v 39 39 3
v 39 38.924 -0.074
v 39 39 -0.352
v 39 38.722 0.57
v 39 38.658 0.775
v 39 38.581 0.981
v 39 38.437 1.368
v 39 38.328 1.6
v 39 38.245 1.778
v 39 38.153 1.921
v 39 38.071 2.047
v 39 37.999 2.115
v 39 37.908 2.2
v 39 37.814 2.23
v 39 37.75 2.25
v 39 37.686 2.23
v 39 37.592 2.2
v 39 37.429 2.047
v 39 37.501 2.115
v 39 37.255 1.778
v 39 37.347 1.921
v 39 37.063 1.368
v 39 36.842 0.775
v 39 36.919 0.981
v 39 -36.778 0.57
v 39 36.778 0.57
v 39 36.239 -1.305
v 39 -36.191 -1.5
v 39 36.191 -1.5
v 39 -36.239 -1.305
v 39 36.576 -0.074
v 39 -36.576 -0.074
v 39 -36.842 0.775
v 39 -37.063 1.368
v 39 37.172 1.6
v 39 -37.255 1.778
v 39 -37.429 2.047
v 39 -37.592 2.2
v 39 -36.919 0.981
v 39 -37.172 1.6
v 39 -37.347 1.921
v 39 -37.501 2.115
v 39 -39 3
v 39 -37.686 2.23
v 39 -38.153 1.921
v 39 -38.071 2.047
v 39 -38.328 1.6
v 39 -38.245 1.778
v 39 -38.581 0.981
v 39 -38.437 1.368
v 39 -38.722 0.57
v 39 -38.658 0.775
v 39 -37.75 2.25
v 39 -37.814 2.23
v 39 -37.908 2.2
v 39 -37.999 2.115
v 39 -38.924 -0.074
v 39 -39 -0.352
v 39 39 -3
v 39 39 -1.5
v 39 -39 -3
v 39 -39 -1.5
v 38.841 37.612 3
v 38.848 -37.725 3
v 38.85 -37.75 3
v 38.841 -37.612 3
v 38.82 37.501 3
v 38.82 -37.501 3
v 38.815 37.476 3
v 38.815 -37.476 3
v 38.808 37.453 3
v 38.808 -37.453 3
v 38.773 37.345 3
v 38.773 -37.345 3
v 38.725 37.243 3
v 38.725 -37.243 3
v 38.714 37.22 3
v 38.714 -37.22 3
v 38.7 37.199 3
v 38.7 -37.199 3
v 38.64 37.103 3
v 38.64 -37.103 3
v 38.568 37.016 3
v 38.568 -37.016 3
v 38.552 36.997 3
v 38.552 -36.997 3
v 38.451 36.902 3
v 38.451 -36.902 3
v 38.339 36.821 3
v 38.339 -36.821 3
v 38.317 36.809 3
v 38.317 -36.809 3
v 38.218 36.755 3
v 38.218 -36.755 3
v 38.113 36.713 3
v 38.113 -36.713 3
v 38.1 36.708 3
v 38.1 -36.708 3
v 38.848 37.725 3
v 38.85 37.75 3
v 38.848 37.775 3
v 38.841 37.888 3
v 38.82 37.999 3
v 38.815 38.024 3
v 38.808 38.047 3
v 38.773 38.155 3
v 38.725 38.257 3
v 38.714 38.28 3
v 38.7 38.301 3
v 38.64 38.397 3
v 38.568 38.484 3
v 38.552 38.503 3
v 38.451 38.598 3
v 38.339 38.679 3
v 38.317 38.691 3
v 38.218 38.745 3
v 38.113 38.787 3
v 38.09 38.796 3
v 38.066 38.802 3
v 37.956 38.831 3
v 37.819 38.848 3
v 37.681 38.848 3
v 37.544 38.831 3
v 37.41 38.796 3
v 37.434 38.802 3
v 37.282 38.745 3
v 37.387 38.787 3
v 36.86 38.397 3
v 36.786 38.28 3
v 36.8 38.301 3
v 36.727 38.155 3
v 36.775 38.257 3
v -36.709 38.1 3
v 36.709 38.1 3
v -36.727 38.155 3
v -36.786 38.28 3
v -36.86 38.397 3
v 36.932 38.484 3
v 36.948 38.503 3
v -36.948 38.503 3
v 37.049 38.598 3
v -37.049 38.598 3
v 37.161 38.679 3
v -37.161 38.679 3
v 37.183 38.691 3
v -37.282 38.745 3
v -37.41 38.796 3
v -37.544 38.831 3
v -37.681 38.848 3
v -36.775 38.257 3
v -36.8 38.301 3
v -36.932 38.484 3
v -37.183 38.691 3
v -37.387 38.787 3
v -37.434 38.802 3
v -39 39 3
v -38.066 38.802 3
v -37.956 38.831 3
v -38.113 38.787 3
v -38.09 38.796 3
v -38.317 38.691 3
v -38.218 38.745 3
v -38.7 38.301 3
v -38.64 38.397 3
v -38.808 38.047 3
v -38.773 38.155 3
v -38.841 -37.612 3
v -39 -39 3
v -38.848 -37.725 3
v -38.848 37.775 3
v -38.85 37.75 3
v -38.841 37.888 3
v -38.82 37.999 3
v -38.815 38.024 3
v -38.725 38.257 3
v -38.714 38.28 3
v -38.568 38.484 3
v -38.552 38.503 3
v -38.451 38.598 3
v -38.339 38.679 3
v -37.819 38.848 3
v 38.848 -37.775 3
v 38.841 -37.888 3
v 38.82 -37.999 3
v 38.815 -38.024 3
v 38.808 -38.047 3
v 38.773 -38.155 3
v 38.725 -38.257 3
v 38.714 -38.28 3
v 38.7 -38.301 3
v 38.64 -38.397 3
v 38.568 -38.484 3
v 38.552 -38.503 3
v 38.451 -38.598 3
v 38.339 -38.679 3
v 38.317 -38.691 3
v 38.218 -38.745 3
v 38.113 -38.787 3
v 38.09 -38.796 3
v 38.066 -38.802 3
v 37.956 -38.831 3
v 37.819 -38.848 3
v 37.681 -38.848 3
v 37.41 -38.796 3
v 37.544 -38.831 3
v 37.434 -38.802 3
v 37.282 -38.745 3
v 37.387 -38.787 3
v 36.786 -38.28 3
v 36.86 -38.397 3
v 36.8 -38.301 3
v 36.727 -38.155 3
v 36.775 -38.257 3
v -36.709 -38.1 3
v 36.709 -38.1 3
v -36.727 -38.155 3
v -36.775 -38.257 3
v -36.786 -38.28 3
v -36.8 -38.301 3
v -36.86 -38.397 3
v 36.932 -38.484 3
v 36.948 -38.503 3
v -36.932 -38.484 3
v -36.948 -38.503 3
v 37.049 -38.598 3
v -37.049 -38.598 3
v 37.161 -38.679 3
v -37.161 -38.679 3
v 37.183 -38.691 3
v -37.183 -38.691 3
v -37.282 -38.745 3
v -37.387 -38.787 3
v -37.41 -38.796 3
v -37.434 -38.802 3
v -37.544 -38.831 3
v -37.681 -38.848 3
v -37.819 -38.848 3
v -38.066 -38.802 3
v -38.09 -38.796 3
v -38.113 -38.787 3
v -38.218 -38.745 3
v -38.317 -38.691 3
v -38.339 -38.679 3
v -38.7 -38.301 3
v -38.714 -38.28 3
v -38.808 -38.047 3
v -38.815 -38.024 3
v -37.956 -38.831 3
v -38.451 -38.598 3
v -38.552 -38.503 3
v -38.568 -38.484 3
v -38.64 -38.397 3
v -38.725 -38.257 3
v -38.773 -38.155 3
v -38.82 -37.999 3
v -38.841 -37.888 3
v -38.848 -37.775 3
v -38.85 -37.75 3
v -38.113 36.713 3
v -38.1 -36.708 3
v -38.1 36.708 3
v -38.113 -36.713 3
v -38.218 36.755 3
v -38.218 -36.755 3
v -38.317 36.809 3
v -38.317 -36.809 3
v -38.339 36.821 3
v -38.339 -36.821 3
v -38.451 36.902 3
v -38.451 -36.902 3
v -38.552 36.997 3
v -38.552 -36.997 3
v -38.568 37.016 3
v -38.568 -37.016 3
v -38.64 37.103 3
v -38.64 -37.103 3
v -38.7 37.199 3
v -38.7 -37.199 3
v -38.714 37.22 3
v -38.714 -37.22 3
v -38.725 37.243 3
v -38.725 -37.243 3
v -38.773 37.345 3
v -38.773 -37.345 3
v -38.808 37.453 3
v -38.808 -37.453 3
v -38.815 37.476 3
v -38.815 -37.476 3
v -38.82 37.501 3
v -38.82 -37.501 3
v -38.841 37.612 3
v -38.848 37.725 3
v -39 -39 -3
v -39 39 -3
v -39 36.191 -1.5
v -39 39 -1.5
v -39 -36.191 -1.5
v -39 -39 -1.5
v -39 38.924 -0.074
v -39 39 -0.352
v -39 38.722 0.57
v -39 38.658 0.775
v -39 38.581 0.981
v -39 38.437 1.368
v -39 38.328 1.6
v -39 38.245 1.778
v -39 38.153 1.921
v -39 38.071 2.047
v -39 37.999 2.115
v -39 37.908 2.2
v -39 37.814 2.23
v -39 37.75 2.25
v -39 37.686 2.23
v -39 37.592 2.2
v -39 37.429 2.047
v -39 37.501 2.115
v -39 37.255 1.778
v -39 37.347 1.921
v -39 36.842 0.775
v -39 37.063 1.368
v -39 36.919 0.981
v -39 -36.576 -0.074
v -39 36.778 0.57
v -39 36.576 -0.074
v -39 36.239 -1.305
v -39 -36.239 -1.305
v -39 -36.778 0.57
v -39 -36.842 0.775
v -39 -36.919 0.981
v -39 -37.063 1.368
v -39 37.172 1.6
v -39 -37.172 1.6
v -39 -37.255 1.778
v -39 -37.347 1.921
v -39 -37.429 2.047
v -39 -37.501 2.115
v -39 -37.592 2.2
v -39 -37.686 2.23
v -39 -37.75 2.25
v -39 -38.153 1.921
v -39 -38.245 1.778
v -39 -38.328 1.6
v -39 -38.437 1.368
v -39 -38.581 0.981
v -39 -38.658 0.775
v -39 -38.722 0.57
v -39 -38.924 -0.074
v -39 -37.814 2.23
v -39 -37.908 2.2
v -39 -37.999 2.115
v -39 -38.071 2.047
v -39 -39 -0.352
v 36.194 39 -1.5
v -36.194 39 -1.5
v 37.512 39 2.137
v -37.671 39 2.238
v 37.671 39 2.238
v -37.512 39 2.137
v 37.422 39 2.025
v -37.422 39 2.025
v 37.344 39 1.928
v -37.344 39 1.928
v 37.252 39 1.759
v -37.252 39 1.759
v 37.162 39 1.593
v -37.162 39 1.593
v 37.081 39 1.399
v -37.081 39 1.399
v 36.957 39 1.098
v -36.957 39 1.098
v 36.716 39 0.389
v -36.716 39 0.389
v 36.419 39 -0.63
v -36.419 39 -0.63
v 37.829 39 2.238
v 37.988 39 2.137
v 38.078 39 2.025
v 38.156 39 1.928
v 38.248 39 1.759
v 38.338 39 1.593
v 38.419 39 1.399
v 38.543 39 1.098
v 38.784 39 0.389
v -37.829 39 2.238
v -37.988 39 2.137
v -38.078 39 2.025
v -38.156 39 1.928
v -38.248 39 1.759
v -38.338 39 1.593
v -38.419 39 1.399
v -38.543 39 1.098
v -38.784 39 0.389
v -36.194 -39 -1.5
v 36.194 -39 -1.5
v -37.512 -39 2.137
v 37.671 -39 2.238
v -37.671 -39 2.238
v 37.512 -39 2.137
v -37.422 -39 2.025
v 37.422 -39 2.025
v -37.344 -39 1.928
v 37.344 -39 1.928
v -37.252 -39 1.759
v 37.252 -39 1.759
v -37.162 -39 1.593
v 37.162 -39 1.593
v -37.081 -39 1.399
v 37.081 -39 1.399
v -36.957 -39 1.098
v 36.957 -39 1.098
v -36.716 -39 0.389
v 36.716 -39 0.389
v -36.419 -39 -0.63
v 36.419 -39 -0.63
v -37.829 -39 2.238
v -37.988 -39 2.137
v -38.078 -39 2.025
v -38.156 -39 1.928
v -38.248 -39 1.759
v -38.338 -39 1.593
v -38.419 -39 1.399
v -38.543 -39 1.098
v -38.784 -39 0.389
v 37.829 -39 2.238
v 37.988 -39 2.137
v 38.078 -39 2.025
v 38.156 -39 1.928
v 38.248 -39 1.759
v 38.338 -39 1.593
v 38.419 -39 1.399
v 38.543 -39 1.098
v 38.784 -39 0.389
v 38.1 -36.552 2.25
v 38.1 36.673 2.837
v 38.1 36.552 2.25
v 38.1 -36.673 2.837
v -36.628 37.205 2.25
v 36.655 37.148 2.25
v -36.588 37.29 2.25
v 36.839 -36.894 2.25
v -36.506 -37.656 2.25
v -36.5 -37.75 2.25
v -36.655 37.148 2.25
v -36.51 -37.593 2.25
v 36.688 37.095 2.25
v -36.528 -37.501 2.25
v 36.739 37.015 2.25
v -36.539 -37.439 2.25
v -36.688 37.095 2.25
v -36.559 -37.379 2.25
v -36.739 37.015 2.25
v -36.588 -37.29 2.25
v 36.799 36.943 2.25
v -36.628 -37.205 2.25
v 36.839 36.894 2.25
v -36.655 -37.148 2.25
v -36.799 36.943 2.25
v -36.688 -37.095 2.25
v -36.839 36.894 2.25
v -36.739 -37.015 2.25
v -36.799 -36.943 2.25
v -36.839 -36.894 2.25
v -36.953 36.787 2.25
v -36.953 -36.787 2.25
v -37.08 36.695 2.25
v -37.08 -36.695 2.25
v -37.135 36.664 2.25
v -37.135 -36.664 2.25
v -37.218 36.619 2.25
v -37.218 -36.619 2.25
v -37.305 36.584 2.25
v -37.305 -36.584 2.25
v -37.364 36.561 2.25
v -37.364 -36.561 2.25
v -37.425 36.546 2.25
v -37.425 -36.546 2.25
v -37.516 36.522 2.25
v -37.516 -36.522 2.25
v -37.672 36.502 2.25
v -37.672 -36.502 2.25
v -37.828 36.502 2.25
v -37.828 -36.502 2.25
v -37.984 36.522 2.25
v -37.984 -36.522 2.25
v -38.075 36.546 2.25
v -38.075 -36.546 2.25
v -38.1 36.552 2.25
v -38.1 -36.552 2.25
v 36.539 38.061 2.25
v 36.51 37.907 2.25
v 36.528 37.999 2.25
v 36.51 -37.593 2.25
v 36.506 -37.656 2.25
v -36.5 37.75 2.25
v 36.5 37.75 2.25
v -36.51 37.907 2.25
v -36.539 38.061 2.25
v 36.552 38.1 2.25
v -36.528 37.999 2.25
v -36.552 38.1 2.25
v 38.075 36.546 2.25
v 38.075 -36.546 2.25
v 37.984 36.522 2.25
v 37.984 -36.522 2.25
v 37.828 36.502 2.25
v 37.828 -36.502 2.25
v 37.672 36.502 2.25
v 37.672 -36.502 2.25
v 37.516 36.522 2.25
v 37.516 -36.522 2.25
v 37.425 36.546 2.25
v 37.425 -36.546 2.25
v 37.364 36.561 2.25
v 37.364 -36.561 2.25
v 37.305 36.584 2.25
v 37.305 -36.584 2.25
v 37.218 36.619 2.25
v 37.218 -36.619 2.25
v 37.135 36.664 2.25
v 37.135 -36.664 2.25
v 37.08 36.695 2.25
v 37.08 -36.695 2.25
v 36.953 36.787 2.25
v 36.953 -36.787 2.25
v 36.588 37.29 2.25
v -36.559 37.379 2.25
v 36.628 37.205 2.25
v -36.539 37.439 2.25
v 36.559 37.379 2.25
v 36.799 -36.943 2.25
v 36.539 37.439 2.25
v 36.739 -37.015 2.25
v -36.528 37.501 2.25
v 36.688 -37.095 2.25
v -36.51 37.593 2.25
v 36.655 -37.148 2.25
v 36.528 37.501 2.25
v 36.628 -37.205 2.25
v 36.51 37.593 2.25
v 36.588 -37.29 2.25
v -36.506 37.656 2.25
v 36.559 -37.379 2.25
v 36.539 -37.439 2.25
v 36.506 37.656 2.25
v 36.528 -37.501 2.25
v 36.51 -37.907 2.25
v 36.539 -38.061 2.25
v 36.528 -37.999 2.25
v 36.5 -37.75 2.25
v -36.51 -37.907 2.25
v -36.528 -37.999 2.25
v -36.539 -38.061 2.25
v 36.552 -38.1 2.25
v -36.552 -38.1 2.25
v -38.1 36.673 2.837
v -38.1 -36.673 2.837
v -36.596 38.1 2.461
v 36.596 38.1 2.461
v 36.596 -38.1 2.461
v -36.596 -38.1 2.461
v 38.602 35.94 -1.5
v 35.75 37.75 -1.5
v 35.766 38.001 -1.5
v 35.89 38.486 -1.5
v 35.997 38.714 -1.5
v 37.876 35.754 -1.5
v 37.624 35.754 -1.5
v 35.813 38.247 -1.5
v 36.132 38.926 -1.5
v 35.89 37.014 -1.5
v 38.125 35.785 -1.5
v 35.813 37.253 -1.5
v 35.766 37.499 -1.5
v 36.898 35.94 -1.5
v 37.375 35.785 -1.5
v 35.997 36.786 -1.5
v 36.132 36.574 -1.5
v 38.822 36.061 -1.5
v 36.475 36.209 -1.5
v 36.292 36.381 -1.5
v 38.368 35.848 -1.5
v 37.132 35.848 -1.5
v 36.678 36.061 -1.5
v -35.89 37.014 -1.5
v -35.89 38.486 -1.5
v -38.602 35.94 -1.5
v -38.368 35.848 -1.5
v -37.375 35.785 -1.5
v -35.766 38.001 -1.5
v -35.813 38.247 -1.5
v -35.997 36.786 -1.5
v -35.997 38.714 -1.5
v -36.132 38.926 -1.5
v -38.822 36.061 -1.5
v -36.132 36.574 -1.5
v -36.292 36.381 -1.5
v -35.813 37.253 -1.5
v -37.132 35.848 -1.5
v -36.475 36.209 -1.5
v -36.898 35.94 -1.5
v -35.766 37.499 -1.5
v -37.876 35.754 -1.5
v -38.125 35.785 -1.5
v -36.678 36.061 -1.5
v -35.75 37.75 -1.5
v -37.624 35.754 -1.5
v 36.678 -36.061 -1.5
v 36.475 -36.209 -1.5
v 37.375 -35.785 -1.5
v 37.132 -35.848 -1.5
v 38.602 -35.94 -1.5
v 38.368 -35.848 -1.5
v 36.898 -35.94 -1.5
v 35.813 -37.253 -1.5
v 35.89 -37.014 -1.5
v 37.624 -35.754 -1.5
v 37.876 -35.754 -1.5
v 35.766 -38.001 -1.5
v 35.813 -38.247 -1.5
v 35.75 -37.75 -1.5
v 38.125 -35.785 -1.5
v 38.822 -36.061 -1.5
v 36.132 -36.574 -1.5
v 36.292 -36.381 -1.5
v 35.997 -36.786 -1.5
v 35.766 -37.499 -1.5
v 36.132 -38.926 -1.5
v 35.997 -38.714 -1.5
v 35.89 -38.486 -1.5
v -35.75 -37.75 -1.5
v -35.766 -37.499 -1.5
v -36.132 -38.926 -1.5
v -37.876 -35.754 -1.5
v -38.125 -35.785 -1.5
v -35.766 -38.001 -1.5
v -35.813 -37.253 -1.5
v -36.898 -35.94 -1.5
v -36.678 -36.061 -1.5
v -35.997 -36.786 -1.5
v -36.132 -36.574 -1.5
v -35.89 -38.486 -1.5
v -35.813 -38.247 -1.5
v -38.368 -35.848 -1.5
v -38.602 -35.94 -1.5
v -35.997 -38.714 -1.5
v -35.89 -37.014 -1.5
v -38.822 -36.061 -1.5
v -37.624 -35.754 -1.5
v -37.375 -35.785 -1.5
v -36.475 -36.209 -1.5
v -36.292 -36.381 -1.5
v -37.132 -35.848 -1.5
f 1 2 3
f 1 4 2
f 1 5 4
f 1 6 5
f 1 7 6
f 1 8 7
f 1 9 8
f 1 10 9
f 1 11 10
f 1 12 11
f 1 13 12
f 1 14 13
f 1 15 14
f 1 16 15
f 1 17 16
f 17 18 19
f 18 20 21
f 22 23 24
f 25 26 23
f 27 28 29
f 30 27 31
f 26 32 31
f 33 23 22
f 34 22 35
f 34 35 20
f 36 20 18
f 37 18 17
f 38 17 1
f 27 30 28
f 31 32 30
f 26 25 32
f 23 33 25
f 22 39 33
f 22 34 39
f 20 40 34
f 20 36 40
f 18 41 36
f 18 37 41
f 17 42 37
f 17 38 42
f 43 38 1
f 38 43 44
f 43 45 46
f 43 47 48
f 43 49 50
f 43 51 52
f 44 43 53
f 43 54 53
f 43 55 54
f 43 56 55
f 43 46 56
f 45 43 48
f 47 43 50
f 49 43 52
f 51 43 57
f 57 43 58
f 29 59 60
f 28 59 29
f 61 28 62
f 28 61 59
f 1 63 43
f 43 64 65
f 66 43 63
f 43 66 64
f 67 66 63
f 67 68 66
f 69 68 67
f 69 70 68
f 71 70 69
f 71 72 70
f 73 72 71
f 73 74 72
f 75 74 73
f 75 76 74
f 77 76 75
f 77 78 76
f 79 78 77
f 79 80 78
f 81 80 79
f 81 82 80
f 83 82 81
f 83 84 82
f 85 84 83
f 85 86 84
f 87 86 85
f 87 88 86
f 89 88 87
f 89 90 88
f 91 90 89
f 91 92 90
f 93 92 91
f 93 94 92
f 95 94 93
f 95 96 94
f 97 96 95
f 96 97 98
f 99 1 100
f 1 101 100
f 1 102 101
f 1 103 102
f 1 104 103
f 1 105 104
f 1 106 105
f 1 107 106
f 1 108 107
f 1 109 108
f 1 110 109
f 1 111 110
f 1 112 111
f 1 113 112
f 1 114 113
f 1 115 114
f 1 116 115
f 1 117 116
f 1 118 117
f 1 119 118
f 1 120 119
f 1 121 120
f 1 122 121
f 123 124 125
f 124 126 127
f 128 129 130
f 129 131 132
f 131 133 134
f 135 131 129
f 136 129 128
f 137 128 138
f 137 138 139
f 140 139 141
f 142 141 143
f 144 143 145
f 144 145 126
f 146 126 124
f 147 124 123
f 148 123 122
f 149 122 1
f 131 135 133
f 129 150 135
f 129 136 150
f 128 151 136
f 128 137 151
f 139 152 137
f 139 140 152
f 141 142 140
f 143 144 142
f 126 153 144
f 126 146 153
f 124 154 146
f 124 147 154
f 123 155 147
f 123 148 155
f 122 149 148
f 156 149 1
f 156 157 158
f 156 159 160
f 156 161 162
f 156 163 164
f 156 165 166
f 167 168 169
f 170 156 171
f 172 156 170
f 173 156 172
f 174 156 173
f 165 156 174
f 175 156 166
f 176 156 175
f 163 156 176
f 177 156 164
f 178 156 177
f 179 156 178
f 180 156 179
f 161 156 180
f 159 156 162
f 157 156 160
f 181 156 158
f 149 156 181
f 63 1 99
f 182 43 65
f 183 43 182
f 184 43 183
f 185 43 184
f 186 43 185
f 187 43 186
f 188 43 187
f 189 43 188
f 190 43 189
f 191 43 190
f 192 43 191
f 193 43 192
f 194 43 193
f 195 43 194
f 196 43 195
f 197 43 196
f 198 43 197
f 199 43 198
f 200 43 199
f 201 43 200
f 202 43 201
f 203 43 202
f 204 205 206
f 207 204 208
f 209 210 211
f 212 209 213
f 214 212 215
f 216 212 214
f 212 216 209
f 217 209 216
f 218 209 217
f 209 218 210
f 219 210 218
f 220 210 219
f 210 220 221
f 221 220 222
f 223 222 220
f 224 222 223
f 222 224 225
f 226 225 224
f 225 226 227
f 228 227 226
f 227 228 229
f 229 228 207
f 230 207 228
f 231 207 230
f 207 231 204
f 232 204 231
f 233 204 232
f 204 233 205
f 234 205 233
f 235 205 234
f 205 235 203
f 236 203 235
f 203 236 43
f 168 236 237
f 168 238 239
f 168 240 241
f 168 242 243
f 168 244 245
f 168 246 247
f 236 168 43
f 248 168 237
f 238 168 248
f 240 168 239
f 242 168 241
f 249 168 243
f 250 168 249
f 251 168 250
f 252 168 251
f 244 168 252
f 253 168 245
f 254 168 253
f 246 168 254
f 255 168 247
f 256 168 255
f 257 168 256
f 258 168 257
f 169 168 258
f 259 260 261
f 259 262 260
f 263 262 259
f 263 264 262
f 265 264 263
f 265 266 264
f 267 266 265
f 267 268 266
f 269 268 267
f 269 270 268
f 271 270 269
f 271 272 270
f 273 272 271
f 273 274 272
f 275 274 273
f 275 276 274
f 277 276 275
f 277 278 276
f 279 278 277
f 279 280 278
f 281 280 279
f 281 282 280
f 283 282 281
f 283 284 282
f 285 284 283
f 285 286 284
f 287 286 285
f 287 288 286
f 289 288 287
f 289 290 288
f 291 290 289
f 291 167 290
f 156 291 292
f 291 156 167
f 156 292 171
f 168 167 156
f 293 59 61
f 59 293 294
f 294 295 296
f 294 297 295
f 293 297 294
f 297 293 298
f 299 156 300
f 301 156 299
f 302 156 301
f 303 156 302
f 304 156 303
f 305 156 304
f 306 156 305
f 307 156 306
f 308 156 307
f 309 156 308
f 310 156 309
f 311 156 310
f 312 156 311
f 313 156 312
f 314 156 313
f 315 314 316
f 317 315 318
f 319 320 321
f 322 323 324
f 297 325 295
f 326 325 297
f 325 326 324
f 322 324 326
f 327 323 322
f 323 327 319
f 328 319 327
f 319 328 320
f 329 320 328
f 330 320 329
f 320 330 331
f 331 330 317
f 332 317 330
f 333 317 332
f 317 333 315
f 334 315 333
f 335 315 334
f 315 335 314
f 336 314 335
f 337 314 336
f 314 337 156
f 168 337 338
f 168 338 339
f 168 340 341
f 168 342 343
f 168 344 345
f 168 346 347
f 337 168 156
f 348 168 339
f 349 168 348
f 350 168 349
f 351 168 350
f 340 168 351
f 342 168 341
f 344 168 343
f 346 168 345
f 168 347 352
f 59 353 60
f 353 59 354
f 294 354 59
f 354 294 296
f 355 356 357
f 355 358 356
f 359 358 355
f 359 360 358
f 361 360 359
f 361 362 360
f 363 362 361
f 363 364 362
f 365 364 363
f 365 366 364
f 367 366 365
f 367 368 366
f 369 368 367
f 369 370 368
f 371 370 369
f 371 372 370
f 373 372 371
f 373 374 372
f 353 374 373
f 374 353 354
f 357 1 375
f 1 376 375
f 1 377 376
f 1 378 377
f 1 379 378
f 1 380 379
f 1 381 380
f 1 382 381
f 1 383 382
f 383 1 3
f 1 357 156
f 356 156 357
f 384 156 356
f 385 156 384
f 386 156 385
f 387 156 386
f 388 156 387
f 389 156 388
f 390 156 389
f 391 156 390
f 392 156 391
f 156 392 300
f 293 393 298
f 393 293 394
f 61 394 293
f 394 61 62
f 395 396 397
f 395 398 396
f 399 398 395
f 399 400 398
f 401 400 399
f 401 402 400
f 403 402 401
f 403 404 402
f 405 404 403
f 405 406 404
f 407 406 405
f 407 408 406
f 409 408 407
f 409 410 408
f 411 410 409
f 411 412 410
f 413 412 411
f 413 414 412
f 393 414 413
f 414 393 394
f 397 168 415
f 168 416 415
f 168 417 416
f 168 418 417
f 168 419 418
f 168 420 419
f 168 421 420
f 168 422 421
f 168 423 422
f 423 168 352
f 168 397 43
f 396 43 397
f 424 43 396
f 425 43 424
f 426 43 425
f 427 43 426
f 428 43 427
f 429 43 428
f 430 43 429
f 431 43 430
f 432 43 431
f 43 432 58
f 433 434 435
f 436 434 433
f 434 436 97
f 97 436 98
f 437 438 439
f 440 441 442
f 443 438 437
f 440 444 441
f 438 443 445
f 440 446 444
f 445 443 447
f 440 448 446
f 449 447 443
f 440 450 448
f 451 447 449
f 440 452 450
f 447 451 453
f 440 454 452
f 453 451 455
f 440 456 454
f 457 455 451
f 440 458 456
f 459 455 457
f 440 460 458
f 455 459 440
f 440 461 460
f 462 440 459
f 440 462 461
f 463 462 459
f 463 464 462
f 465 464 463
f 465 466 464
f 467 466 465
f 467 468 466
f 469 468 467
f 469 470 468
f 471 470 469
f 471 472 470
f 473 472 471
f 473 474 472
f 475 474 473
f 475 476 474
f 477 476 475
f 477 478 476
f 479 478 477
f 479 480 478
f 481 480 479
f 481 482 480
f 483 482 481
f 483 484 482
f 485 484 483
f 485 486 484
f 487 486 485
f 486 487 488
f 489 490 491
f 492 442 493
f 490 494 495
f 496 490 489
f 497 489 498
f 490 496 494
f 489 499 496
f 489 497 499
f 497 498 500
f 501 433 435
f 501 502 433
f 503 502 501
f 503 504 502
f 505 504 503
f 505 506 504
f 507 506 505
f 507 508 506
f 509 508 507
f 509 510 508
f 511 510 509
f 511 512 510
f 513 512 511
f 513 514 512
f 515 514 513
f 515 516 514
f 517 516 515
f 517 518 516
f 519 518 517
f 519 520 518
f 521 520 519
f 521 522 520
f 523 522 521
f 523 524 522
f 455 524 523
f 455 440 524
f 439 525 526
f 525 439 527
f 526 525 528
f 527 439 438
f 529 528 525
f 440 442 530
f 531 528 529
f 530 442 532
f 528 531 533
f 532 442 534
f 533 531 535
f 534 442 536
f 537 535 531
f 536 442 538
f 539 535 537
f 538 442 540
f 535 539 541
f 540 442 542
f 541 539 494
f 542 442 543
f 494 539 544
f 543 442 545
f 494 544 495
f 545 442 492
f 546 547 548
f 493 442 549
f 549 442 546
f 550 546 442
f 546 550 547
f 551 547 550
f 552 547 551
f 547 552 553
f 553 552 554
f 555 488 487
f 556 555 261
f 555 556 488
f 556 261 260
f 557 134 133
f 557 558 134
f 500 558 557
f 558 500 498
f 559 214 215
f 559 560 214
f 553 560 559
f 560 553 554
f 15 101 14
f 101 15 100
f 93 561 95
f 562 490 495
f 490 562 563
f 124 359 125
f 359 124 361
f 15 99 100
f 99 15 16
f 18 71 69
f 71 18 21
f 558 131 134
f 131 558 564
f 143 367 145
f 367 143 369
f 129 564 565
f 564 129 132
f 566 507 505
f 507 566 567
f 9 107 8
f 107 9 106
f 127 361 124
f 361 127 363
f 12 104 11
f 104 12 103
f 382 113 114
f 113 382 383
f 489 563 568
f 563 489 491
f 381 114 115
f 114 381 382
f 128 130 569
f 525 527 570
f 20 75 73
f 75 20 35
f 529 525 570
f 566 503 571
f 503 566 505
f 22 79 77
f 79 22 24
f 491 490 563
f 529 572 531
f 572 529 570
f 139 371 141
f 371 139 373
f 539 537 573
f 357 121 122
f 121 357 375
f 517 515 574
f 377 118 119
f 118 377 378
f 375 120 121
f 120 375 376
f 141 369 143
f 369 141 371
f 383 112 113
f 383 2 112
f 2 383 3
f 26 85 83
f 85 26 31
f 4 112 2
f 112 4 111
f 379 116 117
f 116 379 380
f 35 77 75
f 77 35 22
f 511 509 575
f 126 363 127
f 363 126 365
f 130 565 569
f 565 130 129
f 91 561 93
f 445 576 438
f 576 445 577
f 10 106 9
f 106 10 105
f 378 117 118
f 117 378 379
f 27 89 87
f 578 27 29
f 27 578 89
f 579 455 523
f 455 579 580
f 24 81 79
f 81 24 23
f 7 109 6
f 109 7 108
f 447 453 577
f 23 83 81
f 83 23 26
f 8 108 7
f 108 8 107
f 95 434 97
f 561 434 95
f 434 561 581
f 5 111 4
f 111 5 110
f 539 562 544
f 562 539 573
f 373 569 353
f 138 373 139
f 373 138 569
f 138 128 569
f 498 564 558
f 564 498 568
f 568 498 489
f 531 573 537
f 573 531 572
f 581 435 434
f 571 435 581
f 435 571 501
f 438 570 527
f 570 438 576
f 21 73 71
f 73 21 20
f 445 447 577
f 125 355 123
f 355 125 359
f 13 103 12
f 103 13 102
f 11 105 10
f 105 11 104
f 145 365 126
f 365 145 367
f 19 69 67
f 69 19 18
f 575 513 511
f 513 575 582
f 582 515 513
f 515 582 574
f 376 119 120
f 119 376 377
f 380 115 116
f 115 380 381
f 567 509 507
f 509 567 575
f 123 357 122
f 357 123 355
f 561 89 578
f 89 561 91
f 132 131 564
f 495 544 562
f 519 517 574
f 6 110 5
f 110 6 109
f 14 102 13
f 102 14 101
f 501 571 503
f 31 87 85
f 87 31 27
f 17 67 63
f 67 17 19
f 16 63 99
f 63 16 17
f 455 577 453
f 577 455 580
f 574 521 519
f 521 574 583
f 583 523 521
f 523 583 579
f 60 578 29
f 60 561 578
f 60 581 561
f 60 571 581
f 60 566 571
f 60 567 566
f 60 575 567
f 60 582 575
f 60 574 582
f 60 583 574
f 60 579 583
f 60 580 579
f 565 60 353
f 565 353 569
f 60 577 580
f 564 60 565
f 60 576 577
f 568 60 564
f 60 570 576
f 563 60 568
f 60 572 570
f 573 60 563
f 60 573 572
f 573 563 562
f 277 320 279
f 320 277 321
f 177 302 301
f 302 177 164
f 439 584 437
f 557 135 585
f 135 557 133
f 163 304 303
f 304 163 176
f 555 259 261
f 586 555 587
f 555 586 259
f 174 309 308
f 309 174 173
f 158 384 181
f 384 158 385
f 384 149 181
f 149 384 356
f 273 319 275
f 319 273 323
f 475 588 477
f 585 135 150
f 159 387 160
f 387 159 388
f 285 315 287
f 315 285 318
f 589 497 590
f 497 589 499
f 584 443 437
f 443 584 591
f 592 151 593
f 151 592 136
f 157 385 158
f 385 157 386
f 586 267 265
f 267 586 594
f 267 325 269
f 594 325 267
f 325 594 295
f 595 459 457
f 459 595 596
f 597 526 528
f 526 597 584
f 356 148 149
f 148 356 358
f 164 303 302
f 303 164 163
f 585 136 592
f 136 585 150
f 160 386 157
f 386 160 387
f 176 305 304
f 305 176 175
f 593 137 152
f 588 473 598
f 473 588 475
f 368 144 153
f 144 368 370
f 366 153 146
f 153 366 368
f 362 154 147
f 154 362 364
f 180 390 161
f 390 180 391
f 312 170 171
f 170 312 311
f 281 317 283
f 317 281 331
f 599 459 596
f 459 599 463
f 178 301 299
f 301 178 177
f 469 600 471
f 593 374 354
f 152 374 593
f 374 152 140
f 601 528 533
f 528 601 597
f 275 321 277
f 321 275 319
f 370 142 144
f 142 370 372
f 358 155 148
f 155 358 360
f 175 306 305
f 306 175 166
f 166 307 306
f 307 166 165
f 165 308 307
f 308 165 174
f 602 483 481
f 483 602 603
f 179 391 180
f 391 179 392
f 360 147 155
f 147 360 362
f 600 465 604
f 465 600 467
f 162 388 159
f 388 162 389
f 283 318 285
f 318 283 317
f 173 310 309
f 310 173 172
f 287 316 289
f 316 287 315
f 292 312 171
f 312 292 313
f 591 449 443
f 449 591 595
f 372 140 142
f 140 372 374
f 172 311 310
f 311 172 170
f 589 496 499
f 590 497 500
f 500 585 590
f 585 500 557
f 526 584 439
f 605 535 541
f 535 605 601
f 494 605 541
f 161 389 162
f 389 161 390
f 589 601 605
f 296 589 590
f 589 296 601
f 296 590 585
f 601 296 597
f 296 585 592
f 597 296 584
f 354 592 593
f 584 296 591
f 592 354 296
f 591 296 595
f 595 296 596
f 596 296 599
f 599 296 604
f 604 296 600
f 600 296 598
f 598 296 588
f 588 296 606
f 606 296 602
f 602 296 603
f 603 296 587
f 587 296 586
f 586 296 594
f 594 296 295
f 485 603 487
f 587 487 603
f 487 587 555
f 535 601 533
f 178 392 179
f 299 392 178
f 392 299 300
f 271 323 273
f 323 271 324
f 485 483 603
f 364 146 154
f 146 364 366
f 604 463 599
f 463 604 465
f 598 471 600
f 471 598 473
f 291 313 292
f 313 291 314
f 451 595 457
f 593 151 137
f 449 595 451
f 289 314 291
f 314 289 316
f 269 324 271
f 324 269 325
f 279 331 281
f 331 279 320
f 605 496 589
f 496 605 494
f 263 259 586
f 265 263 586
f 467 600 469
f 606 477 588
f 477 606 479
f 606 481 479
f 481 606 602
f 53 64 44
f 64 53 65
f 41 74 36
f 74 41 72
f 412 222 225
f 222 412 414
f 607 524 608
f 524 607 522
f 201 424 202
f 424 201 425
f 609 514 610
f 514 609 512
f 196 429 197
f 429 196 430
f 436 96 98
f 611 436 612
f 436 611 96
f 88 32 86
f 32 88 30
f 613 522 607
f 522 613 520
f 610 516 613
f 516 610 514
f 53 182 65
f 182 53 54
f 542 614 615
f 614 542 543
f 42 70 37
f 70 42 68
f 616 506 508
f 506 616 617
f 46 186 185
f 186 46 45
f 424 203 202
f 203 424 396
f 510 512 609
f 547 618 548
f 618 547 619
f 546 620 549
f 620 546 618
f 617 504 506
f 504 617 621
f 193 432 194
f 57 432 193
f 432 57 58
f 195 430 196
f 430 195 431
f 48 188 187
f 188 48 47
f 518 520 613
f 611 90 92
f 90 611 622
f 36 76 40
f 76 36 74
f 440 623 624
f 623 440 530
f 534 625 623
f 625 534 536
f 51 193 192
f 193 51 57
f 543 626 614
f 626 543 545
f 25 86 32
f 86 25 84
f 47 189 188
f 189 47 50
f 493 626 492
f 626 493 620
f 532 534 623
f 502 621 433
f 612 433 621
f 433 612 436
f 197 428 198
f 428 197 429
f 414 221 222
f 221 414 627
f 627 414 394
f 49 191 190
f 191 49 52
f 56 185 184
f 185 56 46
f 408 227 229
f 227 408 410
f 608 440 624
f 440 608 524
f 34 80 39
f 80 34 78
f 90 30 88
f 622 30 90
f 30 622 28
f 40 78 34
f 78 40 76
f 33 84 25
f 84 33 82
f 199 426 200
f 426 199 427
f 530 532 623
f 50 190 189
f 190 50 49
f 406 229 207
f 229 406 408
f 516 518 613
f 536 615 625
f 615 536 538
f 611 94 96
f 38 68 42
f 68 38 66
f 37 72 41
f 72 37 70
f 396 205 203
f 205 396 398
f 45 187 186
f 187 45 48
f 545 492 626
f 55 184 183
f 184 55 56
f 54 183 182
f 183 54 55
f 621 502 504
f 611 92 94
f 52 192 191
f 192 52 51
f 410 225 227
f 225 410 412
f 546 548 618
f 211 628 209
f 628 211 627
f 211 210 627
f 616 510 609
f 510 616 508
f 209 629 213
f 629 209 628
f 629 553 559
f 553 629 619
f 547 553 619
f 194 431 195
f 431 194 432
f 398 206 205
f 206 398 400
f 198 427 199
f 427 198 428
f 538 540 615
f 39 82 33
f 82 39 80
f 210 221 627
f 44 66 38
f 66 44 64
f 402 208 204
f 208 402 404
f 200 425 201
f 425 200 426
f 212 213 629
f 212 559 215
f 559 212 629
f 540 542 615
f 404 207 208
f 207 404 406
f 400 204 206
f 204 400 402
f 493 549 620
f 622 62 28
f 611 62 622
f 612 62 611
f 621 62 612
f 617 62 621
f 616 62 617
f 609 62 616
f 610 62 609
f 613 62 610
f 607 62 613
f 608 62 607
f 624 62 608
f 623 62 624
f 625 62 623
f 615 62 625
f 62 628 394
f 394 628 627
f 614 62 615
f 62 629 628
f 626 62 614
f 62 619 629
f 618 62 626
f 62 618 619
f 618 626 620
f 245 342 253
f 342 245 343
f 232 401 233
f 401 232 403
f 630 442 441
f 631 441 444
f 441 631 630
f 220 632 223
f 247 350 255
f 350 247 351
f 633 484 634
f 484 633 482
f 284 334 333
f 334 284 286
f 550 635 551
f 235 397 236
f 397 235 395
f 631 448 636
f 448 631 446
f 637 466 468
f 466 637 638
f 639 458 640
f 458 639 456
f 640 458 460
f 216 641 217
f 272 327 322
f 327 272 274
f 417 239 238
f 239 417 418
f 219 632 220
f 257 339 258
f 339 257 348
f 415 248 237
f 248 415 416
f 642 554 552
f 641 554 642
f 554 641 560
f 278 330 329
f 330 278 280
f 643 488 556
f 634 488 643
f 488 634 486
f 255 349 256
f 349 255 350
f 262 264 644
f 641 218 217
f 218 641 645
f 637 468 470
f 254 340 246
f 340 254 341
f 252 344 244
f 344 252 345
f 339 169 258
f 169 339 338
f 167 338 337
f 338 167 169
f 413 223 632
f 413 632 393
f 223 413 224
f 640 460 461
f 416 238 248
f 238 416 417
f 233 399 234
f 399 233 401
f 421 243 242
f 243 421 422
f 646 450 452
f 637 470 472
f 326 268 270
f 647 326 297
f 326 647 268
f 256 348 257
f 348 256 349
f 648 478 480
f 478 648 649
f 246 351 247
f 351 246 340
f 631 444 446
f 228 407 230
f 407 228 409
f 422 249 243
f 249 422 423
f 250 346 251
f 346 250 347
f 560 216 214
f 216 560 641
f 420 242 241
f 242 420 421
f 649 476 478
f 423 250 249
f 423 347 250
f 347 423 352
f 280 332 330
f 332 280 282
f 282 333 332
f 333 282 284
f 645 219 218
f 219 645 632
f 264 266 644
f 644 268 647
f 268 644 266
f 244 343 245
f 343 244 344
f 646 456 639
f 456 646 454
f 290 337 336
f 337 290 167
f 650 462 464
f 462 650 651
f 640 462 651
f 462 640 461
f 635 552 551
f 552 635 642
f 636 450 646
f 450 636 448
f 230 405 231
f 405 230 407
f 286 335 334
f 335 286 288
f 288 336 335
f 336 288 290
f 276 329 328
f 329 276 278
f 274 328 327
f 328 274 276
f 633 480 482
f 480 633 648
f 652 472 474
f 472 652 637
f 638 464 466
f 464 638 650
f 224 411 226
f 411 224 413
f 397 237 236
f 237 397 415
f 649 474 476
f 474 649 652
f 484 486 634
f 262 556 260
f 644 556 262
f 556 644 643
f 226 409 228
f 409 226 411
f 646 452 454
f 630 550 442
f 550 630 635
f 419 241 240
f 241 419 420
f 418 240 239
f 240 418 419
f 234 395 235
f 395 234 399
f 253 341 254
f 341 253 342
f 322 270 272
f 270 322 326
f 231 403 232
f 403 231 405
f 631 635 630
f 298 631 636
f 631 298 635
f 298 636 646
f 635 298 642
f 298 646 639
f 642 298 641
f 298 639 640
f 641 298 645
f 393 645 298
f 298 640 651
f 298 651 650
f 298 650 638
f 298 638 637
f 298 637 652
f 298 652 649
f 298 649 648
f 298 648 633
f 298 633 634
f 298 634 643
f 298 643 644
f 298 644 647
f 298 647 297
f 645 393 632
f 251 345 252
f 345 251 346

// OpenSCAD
inset_x = 76.2;
inset_y = 76.2;
inset_z = 2.5;

outer_x = 78;
outer_y = 78;
outer_z = 6;

hole_r = 2;
hole_z = 5;
$fn=50;

edge_inset = 2.5;

hole_x = ((outer_x - edge_inset) / 2);
neg_hole_x = (((outer_x - edge_inset) / 2) * -1);
hole_y = ((outer_y - edge_inset) / 2);
neg_hole_y = (((outer_y - edge_inset) / 2) * -1 );

difference() {
    cube([outer_x, outer_y, outer_z], center = true);
    translate([0, 0, 3.5])
    {
        cube([inset_x, inset_y, inset_z], center = true);
    }
    
    translate([hole_x, hole_y, -1.5])
    {
        cylinder(hole_z, hole_r, false);
    }

    translate([neg_hole_x, hole_y, -1.5])
    {
        cylinder(hole_z, hole_r, false);
    }

    translate([hole_x, neg_hole_y, -1.5])
    {
        cylinder(hole_z, hole_r, false);
    }

    translate([neg_hole_x, neg_hole_y, -1.5])
    {
        cylinder(hole_z, hole_r, false);
    }
}
